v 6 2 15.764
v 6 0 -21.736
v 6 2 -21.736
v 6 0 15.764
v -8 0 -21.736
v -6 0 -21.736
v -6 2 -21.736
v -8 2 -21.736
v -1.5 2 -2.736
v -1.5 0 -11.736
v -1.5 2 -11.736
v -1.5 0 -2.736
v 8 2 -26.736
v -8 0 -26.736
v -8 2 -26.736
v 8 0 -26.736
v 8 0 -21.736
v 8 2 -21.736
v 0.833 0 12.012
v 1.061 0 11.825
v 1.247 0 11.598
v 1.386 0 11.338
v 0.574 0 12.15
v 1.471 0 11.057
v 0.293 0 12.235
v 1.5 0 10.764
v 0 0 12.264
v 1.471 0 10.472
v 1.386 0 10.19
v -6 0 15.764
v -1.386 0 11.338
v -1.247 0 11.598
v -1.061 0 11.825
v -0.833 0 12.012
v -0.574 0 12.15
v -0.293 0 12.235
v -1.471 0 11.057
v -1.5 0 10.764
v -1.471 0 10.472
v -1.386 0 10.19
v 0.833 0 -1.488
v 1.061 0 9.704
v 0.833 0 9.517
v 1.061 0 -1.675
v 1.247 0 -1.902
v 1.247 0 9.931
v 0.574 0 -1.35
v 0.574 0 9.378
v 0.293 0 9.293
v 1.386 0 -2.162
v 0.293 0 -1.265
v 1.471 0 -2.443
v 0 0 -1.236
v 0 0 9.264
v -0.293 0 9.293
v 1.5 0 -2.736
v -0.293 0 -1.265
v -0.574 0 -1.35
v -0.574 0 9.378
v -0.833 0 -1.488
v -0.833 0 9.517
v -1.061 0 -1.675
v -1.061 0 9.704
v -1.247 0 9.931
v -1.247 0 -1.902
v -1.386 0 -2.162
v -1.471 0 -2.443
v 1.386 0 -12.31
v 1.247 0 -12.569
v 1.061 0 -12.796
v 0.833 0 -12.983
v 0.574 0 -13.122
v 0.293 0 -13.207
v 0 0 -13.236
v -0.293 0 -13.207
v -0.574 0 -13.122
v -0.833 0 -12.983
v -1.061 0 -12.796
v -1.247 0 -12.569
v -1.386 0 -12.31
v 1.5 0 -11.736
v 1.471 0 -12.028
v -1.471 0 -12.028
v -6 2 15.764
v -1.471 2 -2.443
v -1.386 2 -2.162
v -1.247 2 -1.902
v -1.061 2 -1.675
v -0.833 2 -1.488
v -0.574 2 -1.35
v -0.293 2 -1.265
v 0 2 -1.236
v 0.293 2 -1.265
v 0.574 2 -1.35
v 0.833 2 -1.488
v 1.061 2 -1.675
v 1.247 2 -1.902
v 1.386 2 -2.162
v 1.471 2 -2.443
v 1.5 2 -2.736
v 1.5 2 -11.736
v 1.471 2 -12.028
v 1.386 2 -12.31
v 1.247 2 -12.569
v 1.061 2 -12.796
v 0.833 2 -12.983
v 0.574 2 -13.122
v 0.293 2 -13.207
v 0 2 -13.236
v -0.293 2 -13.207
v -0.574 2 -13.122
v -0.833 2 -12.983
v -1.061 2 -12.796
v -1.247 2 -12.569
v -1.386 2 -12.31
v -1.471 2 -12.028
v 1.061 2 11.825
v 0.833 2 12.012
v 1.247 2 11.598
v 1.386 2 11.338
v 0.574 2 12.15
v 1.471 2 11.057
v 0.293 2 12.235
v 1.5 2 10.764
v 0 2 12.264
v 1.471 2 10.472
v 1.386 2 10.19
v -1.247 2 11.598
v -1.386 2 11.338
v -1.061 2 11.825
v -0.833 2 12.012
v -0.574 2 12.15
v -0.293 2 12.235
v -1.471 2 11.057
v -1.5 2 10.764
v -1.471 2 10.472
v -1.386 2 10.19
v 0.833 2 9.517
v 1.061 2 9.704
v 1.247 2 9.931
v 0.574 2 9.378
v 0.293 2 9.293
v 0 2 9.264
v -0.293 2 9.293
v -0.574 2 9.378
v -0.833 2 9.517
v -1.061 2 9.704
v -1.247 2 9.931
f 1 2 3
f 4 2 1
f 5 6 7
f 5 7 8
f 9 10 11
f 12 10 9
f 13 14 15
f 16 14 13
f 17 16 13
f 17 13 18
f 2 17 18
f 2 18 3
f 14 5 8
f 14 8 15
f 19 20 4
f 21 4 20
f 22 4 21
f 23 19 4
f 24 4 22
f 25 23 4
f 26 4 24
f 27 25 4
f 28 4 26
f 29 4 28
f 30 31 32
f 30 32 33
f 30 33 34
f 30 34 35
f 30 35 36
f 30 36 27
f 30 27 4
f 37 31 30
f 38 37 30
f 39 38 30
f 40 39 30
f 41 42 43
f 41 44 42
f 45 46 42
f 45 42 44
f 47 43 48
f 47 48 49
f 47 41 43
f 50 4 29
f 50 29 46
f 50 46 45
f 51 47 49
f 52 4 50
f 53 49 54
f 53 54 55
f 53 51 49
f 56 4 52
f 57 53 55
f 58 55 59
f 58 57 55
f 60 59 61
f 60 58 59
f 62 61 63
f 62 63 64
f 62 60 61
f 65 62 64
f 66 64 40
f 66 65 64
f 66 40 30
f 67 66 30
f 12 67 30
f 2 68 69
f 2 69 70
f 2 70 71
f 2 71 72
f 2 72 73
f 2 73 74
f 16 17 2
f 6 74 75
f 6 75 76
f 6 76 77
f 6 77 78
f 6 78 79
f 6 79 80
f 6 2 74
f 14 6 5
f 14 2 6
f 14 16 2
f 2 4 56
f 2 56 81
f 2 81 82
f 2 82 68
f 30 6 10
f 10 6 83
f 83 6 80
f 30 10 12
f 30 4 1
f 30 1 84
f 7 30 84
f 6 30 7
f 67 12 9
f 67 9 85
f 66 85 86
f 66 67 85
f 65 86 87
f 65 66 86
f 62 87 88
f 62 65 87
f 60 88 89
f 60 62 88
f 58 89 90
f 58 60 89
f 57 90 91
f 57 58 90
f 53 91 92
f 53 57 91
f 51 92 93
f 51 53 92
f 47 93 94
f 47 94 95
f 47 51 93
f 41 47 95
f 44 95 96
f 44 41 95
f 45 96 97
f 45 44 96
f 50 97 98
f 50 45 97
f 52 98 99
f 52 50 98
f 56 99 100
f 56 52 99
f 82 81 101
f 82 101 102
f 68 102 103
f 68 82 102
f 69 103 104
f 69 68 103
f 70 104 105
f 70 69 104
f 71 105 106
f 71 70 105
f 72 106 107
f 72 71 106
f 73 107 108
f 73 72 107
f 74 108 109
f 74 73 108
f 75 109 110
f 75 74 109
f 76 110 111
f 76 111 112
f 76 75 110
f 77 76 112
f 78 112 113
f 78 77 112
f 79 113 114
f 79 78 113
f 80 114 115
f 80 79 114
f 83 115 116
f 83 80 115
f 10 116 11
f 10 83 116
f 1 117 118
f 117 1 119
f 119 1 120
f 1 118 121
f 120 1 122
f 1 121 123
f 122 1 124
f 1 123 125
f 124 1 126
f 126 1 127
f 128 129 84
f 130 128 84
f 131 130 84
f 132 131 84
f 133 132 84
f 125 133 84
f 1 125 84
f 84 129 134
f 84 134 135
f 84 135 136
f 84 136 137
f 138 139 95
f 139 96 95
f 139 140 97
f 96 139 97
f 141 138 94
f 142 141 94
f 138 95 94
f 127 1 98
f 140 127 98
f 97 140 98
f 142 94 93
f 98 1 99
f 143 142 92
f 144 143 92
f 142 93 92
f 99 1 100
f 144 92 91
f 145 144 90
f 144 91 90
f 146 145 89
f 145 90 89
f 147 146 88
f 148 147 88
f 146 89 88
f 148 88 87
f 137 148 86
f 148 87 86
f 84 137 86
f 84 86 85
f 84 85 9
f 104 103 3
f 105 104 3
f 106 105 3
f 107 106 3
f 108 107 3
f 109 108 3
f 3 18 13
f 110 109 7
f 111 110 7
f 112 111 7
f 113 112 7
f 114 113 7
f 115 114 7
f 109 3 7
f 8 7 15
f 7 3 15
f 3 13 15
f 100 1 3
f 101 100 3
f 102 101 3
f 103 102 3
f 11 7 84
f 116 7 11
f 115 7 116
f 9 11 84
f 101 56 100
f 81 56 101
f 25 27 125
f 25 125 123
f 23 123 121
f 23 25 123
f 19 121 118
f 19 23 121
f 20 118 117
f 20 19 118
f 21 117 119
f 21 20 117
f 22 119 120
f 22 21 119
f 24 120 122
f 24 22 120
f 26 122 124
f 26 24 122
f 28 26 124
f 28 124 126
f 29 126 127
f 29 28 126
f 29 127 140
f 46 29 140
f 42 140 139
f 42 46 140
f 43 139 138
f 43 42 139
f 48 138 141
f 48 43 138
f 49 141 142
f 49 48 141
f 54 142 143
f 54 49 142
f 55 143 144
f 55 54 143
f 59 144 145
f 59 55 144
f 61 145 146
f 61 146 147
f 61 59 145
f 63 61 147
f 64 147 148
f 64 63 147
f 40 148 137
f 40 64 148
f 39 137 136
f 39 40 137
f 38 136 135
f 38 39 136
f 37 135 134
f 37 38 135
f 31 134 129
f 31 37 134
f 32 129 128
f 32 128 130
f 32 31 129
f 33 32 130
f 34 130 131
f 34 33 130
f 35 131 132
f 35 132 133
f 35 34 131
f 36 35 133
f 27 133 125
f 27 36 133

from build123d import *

# Parameters (mm, degrees)
SKETCH1_R           = 1.5
BOSS_EXTRUDE1_DEPTH = 2


with BuildPart() as part:
    # Sketch1 → Boss-Extrude1 (new body)
    with BuildSketch(Plane(origin=(0, 0, 0), x_dir=(1, 0, 0), z_dir=(0, 1, 0))):
        Polygon((-6, 21.735699927), (-8, 21.735699927), (-8, 26.735699927), (8, 26.735699927), (8, 21.735699927), (6, 21.735699927), (6, -15.764300073), (-6, -15.764300073), align=None)
        with Locations(Location((0, -10.764300073, 0), (0, 0, 270))):
            Circle(SKETCH1_R, mode=Mode.SUBTRACT)
        with BuildLine():
            Line((1.5, 2.735699927), (1.5, 11.735699927))
            ThreePointArc((1.5, 11.735699927), (0, 13.235699927), (-1.5, 11.735699927))
            Line((-1.5, 11.735699927), (-1.5, 2.735699927))
            ThreePointArc((-1.5, 2.735699927), (0, 1.235699927), (1.5, 2.735699927))
        make_face(mode=Mode.SUBTRACT)
    extrude(amount=BOSS_EXTRUDE1_DEPTH)


solid = part.part
